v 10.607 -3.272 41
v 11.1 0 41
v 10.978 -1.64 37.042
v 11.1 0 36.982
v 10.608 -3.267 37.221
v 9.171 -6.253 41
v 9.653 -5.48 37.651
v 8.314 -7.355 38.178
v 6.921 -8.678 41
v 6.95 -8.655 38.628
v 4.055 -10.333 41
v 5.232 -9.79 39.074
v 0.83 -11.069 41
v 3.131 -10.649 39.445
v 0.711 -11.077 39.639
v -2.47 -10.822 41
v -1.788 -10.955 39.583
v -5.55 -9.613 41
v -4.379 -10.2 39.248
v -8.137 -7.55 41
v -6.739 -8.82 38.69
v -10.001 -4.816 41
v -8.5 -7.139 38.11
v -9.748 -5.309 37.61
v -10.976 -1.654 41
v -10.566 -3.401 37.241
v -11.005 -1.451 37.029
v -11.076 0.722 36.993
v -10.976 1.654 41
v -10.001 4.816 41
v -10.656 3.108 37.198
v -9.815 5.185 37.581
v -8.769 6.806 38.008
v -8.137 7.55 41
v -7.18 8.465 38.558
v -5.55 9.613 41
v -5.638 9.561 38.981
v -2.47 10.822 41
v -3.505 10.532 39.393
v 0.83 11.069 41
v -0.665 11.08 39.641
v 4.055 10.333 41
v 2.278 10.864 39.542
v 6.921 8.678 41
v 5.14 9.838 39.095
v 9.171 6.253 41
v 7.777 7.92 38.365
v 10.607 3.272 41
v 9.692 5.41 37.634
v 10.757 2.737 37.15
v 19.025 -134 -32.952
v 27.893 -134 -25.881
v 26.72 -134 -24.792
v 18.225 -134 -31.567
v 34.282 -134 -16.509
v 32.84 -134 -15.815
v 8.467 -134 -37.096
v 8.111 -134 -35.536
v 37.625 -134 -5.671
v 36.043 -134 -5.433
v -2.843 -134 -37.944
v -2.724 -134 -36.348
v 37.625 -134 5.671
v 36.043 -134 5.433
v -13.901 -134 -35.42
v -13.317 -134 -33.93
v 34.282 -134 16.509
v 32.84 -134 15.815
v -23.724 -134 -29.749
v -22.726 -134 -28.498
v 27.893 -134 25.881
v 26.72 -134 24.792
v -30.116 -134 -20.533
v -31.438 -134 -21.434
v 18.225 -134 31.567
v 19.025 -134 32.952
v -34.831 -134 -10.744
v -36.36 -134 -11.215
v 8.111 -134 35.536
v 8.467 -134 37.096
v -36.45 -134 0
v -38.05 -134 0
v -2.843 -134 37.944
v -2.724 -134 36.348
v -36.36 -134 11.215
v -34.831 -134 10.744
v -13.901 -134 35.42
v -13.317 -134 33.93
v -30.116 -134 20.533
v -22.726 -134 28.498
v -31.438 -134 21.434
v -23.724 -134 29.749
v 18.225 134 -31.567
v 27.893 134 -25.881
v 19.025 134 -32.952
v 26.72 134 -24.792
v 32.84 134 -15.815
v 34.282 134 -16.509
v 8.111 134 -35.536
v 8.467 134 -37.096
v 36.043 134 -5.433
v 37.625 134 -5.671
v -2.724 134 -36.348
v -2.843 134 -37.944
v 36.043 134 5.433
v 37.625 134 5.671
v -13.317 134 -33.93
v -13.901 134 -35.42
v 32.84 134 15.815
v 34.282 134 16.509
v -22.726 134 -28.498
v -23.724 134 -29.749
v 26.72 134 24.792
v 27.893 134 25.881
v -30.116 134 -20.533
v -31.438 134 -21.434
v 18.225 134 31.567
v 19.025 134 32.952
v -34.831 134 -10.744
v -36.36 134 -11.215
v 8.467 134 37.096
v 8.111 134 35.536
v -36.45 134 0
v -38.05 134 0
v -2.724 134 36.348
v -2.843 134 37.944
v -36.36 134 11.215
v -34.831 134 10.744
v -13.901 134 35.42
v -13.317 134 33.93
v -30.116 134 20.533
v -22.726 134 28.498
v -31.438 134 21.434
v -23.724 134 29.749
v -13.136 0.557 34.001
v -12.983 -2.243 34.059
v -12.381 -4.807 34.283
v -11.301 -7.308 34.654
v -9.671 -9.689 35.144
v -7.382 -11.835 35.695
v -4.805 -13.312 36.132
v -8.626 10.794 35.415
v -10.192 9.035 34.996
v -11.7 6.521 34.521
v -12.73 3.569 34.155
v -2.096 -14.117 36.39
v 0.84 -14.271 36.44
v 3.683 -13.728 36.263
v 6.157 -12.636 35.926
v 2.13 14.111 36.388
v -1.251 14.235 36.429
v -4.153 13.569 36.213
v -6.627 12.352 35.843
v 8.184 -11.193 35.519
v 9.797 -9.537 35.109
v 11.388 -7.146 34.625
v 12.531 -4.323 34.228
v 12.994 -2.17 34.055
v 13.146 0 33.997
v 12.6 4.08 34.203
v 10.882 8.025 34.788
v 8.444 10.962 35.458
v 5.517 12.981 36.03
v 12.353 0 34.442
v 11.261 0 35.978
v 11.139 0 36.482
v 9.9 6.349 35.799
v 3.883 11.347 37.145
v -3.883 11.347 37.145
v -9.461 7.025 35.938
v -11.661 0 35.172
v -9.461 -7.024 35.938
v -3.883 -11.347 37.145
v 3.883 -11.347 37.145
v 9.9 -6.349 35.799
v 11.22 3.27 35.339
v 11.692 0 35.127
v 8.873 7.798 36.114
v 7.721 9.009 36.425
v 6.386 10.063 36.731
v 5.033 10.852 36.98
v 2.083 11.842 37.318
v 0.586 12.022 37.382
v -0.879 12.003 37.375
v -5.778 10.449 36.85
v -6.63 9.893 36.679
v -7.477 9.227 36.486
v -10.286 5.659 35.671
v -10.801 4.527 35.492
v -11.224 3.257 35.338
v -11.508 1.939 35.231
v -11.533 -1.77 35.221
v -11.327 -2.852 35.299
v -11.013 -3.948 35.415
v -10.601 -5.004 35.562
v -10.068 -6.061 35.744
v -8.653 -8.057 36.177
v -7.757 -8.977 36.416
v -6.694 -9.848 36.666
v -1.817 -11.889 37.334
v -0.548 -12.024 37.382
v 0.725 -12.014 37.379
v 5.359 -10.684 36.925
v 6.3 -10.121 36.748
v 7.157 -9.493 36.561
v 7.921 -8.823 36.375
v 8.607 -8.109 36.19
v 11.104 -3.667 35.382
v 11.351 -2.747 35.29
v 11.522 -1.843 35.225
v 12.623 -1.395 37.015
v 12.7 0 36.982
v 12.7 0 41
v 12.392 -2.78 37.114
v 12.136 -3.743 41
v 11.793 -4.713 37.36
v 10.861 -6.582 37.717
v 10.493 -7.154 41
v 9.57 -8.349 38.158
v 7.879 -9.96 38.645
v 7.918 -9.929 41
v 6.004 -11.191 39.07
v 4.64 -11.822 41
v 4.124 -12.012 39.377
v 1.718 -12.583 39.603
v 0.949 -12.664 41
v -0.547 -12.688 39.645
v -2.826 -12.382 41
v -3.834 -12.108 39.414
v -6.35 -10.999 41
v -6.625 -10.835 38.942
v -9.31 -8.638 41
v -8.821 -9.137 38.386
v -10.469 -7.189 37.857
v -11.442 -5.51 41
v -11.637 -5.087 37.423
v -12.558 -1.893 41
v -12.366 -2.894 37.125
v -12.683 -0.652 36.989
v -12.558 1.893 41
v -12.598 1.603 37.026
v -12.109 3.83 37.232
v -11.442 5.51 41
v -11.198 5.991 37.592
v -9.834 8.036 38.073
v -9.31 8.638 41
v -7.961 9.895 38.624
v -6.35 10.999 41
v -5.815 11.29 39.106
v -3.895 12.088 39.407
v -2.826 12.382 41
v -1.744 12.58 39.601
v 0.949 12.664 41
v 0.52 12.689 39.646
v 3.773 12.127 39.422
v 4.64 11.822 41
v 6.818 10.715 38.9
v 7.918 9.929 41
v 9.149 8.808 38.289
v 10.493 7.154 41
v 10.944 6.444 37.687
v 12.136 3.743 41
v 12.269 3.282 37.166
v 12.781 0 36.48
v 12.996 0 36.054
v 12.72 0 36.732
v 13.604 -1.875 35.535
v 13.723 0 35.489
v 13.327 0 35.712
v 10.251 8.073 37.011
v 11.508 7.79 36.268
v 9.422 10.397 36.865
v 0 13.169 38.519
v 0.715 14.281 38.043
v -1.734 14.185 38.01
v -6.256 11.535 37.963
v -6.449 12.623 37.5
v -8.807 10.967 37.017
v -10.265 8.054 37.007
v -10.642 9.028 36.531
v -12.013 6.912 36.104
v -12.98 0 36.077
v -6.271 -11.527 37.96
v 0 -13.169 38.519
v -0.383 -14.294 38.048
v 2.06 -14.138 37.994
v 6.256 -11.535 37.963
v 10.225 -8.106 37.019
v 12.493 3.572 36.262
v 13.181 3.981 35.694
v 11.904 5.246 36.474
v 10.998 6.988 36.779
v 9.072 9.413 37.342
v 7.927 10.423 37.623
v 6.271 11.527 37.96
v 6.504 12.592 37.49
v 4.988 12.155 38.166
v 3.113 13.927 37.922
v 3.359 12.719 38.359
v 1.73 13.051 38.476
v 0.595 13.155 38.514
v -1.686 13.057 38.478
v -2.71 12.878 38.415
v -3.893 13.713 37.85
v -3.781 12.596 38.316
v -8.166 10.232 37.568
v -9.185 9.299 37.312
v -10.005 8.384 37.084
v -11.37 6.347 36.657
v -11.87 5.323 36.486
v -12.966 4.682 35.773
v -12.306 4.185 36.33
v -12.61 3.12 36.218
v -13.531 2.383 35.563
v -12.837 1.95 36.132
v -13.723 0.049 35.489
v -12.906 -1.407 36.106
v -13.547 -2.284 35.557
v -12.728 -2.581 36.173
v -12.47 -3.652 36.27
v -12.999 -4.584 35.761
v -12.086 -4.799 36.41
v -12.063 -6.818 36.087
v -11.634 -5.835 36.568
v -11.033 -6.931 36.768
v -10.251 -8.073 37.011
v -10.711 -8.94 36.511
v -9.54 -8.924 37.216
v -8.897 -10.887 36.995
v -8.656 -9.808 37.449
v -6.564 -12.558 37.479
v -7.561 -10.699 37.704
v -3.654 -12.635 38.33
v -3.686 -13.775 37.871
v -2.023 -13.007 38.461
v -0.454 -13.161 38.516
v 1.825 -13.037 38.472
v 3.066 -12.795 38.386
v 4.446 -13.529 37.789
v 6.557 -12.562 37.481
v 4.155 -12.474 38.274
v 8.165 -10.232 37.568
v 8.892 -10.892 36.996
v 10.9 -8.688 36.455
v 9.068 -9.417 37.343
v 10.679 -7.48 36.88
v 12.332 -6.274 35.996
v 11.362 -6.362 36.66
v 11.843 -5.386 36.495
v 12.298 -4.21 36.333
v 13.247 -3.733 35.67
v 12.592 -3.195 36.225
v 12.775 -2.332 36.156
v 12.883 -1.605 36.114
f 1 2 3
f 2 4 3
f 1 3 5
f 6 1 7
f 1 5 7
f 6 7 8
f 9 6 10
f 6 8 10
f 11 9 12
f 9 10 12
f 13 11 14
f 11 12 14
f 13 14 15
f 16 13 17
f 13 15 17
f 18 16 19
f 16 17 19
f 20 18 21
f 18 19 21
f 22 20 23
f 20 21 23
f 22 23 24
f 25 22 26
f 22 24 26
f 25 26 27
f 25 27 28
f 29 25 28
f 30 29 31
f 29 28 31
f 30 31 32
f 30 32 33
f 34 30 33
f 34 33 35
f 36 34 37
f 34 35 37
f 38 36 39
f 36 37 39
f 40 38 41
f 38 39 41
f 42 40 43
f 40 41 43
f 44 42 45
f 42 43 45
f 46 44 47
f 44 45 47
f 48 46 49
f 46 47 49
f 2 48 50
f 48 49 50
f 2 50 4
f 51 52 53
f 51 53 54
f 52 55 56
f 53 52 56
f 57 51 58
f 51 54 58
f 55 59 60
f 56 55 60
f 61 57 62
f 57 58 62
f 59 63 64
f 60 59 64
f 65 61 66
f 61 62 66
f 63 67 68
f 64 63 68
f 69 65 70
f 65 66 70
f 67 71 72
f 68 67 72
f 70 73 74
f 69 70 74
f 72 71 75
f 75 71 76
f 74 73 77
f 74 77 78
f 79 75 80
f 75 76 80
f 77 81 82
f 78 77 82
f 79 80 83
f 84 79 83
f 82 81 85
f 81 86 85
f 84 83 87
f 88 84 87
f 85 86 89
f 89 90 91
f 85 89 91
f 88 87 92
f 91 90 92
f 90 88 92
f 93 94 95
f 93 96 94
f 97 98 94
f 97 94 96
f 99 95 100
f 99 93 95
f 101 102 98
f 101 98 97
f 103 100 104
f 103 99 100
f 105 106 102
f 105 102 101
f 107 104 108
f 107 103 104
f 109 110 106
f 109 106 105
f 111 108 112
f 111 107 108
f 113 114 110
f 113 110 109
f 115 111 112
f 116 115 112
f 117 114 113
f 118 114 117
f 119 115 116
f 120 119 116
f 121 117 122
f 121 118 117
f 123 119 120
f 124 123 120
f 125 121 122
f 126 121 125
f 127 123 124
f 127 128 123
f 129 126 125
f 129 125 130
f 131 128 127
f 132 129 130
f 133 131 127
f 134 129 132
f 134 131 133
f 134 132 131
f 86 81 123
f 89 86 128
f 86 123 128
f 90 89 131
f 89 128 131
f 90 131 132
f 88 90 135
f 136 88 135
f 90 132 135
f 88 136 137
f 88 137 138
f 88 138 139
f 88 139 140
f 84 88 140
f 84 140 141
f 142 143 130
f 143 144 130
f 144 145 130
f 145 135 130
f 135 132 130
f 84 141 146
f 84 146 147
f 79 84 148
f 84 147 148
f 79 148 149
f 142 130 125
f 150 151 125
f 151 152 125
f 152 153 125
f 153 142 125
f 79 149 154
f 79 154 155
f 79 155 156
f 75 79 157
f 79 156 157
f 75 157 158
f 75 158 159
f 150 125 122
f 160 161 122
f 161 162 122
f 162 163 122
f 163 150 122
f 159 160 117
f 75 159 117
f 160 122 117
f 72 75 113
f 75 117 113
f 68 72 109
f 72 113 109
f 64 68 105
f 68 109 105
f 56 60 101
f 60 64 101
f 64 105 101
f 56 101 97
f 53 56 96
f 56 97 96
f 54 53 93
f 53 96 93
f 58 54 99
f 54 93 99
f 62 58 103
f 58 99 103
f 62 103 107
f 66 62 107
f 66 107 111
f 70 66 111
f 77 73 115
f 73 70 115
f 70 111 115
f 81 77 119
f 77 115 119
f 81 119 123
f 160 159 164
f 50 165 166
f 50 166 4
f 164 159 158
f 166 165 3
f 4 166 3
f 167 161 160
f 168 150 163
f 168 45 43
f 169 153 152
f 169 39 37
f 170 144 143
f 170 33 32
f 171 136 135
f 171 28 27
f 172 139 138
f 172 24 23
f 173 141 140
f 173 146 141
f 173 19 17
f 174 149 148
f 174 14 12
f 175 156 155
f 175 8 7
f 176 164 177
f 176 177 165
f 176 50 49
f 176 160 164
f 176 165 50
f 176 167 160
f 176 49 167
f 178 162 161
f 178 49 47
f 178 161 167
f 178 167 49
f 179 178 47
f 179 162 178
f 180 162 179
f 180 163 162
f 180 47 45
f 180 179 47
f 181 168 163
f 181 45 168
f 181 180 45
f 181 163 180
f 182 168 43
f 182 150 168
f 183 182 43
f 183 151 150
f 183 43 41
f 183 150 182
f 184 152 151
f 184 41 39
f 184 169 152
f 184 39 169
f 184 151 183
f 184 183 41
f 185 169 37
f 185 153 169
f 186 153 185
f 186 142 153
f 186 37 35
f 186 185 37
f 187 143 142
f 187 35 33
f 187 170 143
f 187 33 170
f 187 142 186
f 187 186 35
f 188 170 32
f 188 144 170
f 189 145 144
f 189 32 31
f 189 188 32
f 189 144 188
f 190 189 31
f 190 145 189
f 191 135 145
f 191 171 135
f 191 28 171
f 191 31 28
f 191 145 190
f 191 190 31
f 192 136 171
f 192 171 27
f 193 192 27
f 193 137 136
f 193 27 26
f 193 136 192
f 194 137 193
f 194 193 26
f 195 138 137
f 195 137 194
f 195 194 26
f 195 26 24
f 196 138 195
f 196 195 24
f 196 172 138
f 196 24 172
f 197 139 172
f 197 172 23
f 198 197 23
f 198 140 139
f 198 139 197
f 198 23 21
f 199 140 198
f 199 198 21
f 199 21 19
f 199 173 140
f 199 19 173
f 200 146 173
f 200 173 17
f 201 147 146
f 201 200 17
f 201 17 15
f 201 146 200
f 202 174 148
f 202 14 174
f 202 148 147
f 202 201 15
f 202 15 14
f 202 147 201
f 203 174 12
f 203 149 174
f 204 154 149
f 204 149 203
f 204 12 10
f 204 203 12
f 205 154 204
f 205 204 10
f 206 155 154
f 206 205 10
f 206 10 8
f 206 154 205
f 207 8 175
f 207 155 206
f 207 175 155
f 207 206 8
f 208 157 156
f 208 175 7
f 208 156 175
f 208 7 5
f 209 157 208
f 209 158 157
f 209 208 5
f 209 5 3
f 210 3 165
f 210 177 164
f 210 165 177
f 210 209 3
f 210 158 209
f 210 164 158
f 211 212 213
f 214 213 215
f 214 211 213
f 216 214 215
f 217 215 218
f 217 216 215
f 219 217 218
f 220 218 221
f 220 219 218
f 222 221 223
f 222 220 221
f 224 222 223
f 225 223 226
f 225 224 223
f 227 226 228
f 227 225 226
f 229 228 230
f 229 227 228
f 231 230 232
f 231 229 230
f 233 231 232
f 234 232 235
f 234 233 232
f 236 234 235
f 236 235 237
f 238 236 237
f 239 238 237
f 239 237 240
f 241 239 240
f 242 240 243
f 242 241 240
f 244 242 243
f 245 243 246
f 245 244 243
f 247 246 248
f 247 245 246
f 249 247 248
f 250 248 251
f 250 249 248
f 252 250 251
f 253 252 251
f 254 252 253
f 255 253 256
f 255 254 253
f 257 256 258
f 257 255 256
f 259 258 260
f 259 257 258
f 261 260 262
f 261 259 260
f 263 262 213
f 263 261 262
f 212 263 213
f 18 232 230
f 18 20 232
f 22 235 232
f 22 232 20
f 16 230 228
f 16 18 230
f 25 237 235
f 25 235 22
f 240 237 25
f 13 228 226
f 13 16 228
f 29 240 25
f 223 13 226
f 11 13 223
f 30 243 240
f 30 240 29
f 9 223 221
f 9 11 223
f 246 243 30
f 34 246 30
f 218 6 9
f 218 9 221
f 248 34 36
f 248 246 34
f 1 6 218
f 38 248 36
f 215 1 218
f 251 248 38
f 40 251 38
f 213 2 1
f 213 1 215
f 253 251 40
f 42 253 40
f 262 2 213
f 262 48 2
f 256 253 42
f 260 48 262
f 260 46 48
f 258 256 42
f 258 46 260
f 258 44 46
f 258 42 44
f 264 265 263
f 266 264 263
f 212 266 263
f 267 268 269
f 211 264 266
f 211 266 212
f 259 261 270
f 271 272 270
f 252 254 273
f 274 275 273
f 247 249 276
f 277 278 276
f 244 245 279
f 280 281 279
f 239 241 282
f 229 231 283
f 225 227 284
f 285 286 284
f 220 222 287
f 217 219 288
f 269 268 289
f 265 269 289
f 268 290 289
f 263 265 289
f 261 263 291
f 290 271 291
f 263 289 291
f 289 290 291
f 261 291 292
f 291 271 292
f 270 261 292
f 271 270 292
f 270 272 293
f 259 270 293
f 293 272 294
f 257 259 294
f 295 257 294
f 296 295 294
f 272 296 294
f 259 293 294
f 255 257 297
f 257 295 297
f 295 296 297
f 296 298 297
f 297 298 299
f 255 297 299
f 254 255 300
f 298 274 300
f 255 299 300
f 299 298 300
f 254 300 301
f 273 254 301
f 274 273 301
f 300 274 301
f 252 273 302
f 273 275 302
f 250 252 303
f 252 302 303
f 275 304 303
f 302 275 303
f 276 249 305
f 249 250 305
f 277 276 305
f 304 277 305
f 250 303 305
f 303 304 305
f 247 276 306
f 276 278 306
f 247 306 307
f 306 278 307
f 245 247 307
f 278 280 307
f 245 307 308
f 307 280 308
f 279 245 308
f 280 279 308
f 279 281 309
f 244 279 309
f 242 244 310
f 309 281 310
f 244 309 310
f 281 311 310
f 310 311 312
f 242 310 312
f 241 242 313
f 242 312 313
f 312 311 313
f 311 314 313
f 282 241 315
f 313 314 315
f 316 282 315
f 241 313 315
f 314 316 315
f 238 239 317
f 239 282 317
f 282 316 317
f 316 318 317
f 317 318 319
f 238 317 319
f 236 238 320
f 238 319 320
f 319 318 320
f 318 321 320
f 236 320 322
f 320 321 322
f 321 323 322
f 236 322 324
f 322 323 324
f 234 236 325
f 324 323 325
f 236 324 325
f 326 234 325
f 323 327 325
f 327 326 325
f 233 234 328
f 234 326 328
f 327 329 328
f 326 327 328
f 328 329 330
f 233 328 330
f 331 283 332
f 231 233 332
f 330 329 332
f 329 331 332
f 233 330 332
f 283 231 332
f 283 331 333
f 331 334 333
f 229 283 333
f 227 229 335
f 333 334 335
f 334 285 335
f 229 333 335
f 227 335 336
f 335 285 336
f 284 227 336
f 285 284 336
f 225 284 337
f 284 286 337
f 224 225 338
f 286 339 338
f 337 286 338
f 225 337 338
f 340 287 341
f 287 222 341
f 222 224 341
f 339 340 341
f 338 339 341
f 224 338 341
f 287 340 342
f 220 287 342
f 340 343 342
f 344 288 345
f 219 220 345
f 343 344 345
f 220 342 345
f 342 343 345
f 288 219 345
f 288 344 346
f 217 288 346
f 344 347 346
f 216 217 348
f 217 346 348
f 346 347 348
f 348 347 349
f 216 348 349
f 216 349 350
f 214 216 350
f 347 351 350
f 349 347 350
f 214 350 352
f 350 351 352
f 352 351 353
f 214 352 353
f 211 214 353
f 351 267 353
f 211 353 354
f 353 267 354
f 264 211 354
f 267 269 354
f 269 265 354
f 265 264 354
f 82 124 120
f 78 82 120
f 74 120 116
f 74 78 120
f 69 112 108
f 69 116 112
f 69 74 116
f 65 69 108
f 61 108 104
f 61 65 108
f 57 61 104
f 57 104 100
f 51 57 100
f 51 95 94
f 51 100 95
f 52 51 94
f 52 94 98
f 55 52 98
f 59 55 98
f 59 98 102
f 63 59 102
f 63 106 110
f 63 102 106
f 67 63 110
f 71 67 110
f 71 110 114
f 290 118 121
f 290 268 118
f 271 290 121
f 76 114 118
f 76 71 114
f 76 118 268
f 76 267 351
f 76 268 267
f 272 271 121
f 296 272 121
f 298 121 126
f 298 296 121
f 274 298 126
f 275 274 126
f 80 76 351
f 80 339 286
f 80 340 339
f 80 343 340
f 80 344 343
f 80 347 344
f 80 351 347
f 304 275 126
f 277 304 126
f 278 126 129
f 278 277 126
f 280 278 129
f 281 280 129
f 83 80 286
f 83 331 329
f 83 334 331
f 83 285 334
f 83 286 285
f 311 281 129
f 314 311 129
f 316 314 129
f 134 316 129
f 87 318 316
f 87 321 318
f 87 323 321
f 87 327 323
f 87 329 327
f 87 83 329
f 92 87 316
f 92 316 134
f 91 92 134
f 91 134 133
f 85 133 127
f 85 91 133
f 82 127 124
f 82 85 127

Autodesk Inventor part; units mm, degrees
ref_plane "YZ Plane" through (0, 0, 0) normal (1, 0, 0) x (0, 1, 0)
ref_plane "XZ Plane" through (0, 0, 0) normal (0, 1, 0) x (-1, 0, 0)
ref_plane "XY Plane" through (0, 0, 0) normal (0, 0, 1) x (1, 0, 0)
sketch "Szkic8" plane through (0, 0, 0) normal (0, 1, 0) x (-1, 0, 0)
  circle A0 centre (0, 0) radius 38.05
  circle A1 centre (0, 0) radius 36.45
  dimension "d53" = 76.1
  dimension "d54" = 1.6
extrude "Wyciągnięcie proste2" add sketch "Szkic8" along normal mid plane 268
sketch "Szkic13" plane through (0, 0, 0) normal (0, 0, 1) x (1, 0, 0)
  circle A0 centre (0, 0) radius 12.7
  circle A1 centre (0, 0) radius 11.1
  dimension "d67" = 25.4
  dimension "d68" = 1.6
extrude "Wyciągnięcie proste6" add sketch "Szkic13" along normal blind 41
sketch "Szkic14" plane through (0, 0, 41) normal (0, 0, 1) x (1, 0, 0)
  circle A0 centre (0, 0) radius 11.1 projected
extrude "Wyciągnięcie proste7" cut sketch "Szkic14" against normal blind 41
sketch "Szkic15" plane through (0, -134, 0) normal (0, -1, 0) x (1, 0, 0)
  circle A0 centre (0, 0) radius 36.45 projected
extrude "Wyciągnięcie proste8" cut sketch "Szkic15" against normal blind 268
fillet "Zaokrąglenie3" radius 1.6 2 edges at (-0.0006, 12.7, 38.05) (-0.0007, -12.7, 38.05)
fillet "Zaokrąglenie4" radius 3.2 2 edges at (0.0022, -11.1, 36.45) (0, 11.1, 36.45)
equation "\"d53\" = OD"
equation "\"d54\" = THK"
equation "\"d55\" = L1"
equation "\"d67\" = OD2"
equation "\"d68\" = THK"
equation "\"d69\" = L2"
equation "\"d71\" = L2"
equation "\"d73\" = L1"
equation "\"d75\" = THK"
equation "\"d76\" = 2 * THK"
equation "\"SzerokośćGięciaPodcięcia\" = Grubość"
equation "\"RozmiarPodcięciaNarożnika\" = 4 * Grubość"
equation "\"PromieńPrzejścia\" = PromieńGięcia"
equation "\"Rozmiar_promienia_Jacobiego\" = PromieńGięcia"
equation "\"Wielk_odstępu\" = Grubość"
equation "\"d2\" = PromieńGięcia"
equation "\"d23\" = PromieńGięcia"
equation "\"OD\" = 76.1"
equation "\"THK\" = 1.6"
equation "\"L1\" = 268"
equation "\"L2\" = 41"
equation "\"OD2\" = 25.4"
equation "\"Grubość\" = 1.5"
equation "\"PromieńGięcia\" = 3"
properties part number "Trójnik red. krótki  Ø76,1 25,4 76,1 s=1,6 L=268" material "304"
